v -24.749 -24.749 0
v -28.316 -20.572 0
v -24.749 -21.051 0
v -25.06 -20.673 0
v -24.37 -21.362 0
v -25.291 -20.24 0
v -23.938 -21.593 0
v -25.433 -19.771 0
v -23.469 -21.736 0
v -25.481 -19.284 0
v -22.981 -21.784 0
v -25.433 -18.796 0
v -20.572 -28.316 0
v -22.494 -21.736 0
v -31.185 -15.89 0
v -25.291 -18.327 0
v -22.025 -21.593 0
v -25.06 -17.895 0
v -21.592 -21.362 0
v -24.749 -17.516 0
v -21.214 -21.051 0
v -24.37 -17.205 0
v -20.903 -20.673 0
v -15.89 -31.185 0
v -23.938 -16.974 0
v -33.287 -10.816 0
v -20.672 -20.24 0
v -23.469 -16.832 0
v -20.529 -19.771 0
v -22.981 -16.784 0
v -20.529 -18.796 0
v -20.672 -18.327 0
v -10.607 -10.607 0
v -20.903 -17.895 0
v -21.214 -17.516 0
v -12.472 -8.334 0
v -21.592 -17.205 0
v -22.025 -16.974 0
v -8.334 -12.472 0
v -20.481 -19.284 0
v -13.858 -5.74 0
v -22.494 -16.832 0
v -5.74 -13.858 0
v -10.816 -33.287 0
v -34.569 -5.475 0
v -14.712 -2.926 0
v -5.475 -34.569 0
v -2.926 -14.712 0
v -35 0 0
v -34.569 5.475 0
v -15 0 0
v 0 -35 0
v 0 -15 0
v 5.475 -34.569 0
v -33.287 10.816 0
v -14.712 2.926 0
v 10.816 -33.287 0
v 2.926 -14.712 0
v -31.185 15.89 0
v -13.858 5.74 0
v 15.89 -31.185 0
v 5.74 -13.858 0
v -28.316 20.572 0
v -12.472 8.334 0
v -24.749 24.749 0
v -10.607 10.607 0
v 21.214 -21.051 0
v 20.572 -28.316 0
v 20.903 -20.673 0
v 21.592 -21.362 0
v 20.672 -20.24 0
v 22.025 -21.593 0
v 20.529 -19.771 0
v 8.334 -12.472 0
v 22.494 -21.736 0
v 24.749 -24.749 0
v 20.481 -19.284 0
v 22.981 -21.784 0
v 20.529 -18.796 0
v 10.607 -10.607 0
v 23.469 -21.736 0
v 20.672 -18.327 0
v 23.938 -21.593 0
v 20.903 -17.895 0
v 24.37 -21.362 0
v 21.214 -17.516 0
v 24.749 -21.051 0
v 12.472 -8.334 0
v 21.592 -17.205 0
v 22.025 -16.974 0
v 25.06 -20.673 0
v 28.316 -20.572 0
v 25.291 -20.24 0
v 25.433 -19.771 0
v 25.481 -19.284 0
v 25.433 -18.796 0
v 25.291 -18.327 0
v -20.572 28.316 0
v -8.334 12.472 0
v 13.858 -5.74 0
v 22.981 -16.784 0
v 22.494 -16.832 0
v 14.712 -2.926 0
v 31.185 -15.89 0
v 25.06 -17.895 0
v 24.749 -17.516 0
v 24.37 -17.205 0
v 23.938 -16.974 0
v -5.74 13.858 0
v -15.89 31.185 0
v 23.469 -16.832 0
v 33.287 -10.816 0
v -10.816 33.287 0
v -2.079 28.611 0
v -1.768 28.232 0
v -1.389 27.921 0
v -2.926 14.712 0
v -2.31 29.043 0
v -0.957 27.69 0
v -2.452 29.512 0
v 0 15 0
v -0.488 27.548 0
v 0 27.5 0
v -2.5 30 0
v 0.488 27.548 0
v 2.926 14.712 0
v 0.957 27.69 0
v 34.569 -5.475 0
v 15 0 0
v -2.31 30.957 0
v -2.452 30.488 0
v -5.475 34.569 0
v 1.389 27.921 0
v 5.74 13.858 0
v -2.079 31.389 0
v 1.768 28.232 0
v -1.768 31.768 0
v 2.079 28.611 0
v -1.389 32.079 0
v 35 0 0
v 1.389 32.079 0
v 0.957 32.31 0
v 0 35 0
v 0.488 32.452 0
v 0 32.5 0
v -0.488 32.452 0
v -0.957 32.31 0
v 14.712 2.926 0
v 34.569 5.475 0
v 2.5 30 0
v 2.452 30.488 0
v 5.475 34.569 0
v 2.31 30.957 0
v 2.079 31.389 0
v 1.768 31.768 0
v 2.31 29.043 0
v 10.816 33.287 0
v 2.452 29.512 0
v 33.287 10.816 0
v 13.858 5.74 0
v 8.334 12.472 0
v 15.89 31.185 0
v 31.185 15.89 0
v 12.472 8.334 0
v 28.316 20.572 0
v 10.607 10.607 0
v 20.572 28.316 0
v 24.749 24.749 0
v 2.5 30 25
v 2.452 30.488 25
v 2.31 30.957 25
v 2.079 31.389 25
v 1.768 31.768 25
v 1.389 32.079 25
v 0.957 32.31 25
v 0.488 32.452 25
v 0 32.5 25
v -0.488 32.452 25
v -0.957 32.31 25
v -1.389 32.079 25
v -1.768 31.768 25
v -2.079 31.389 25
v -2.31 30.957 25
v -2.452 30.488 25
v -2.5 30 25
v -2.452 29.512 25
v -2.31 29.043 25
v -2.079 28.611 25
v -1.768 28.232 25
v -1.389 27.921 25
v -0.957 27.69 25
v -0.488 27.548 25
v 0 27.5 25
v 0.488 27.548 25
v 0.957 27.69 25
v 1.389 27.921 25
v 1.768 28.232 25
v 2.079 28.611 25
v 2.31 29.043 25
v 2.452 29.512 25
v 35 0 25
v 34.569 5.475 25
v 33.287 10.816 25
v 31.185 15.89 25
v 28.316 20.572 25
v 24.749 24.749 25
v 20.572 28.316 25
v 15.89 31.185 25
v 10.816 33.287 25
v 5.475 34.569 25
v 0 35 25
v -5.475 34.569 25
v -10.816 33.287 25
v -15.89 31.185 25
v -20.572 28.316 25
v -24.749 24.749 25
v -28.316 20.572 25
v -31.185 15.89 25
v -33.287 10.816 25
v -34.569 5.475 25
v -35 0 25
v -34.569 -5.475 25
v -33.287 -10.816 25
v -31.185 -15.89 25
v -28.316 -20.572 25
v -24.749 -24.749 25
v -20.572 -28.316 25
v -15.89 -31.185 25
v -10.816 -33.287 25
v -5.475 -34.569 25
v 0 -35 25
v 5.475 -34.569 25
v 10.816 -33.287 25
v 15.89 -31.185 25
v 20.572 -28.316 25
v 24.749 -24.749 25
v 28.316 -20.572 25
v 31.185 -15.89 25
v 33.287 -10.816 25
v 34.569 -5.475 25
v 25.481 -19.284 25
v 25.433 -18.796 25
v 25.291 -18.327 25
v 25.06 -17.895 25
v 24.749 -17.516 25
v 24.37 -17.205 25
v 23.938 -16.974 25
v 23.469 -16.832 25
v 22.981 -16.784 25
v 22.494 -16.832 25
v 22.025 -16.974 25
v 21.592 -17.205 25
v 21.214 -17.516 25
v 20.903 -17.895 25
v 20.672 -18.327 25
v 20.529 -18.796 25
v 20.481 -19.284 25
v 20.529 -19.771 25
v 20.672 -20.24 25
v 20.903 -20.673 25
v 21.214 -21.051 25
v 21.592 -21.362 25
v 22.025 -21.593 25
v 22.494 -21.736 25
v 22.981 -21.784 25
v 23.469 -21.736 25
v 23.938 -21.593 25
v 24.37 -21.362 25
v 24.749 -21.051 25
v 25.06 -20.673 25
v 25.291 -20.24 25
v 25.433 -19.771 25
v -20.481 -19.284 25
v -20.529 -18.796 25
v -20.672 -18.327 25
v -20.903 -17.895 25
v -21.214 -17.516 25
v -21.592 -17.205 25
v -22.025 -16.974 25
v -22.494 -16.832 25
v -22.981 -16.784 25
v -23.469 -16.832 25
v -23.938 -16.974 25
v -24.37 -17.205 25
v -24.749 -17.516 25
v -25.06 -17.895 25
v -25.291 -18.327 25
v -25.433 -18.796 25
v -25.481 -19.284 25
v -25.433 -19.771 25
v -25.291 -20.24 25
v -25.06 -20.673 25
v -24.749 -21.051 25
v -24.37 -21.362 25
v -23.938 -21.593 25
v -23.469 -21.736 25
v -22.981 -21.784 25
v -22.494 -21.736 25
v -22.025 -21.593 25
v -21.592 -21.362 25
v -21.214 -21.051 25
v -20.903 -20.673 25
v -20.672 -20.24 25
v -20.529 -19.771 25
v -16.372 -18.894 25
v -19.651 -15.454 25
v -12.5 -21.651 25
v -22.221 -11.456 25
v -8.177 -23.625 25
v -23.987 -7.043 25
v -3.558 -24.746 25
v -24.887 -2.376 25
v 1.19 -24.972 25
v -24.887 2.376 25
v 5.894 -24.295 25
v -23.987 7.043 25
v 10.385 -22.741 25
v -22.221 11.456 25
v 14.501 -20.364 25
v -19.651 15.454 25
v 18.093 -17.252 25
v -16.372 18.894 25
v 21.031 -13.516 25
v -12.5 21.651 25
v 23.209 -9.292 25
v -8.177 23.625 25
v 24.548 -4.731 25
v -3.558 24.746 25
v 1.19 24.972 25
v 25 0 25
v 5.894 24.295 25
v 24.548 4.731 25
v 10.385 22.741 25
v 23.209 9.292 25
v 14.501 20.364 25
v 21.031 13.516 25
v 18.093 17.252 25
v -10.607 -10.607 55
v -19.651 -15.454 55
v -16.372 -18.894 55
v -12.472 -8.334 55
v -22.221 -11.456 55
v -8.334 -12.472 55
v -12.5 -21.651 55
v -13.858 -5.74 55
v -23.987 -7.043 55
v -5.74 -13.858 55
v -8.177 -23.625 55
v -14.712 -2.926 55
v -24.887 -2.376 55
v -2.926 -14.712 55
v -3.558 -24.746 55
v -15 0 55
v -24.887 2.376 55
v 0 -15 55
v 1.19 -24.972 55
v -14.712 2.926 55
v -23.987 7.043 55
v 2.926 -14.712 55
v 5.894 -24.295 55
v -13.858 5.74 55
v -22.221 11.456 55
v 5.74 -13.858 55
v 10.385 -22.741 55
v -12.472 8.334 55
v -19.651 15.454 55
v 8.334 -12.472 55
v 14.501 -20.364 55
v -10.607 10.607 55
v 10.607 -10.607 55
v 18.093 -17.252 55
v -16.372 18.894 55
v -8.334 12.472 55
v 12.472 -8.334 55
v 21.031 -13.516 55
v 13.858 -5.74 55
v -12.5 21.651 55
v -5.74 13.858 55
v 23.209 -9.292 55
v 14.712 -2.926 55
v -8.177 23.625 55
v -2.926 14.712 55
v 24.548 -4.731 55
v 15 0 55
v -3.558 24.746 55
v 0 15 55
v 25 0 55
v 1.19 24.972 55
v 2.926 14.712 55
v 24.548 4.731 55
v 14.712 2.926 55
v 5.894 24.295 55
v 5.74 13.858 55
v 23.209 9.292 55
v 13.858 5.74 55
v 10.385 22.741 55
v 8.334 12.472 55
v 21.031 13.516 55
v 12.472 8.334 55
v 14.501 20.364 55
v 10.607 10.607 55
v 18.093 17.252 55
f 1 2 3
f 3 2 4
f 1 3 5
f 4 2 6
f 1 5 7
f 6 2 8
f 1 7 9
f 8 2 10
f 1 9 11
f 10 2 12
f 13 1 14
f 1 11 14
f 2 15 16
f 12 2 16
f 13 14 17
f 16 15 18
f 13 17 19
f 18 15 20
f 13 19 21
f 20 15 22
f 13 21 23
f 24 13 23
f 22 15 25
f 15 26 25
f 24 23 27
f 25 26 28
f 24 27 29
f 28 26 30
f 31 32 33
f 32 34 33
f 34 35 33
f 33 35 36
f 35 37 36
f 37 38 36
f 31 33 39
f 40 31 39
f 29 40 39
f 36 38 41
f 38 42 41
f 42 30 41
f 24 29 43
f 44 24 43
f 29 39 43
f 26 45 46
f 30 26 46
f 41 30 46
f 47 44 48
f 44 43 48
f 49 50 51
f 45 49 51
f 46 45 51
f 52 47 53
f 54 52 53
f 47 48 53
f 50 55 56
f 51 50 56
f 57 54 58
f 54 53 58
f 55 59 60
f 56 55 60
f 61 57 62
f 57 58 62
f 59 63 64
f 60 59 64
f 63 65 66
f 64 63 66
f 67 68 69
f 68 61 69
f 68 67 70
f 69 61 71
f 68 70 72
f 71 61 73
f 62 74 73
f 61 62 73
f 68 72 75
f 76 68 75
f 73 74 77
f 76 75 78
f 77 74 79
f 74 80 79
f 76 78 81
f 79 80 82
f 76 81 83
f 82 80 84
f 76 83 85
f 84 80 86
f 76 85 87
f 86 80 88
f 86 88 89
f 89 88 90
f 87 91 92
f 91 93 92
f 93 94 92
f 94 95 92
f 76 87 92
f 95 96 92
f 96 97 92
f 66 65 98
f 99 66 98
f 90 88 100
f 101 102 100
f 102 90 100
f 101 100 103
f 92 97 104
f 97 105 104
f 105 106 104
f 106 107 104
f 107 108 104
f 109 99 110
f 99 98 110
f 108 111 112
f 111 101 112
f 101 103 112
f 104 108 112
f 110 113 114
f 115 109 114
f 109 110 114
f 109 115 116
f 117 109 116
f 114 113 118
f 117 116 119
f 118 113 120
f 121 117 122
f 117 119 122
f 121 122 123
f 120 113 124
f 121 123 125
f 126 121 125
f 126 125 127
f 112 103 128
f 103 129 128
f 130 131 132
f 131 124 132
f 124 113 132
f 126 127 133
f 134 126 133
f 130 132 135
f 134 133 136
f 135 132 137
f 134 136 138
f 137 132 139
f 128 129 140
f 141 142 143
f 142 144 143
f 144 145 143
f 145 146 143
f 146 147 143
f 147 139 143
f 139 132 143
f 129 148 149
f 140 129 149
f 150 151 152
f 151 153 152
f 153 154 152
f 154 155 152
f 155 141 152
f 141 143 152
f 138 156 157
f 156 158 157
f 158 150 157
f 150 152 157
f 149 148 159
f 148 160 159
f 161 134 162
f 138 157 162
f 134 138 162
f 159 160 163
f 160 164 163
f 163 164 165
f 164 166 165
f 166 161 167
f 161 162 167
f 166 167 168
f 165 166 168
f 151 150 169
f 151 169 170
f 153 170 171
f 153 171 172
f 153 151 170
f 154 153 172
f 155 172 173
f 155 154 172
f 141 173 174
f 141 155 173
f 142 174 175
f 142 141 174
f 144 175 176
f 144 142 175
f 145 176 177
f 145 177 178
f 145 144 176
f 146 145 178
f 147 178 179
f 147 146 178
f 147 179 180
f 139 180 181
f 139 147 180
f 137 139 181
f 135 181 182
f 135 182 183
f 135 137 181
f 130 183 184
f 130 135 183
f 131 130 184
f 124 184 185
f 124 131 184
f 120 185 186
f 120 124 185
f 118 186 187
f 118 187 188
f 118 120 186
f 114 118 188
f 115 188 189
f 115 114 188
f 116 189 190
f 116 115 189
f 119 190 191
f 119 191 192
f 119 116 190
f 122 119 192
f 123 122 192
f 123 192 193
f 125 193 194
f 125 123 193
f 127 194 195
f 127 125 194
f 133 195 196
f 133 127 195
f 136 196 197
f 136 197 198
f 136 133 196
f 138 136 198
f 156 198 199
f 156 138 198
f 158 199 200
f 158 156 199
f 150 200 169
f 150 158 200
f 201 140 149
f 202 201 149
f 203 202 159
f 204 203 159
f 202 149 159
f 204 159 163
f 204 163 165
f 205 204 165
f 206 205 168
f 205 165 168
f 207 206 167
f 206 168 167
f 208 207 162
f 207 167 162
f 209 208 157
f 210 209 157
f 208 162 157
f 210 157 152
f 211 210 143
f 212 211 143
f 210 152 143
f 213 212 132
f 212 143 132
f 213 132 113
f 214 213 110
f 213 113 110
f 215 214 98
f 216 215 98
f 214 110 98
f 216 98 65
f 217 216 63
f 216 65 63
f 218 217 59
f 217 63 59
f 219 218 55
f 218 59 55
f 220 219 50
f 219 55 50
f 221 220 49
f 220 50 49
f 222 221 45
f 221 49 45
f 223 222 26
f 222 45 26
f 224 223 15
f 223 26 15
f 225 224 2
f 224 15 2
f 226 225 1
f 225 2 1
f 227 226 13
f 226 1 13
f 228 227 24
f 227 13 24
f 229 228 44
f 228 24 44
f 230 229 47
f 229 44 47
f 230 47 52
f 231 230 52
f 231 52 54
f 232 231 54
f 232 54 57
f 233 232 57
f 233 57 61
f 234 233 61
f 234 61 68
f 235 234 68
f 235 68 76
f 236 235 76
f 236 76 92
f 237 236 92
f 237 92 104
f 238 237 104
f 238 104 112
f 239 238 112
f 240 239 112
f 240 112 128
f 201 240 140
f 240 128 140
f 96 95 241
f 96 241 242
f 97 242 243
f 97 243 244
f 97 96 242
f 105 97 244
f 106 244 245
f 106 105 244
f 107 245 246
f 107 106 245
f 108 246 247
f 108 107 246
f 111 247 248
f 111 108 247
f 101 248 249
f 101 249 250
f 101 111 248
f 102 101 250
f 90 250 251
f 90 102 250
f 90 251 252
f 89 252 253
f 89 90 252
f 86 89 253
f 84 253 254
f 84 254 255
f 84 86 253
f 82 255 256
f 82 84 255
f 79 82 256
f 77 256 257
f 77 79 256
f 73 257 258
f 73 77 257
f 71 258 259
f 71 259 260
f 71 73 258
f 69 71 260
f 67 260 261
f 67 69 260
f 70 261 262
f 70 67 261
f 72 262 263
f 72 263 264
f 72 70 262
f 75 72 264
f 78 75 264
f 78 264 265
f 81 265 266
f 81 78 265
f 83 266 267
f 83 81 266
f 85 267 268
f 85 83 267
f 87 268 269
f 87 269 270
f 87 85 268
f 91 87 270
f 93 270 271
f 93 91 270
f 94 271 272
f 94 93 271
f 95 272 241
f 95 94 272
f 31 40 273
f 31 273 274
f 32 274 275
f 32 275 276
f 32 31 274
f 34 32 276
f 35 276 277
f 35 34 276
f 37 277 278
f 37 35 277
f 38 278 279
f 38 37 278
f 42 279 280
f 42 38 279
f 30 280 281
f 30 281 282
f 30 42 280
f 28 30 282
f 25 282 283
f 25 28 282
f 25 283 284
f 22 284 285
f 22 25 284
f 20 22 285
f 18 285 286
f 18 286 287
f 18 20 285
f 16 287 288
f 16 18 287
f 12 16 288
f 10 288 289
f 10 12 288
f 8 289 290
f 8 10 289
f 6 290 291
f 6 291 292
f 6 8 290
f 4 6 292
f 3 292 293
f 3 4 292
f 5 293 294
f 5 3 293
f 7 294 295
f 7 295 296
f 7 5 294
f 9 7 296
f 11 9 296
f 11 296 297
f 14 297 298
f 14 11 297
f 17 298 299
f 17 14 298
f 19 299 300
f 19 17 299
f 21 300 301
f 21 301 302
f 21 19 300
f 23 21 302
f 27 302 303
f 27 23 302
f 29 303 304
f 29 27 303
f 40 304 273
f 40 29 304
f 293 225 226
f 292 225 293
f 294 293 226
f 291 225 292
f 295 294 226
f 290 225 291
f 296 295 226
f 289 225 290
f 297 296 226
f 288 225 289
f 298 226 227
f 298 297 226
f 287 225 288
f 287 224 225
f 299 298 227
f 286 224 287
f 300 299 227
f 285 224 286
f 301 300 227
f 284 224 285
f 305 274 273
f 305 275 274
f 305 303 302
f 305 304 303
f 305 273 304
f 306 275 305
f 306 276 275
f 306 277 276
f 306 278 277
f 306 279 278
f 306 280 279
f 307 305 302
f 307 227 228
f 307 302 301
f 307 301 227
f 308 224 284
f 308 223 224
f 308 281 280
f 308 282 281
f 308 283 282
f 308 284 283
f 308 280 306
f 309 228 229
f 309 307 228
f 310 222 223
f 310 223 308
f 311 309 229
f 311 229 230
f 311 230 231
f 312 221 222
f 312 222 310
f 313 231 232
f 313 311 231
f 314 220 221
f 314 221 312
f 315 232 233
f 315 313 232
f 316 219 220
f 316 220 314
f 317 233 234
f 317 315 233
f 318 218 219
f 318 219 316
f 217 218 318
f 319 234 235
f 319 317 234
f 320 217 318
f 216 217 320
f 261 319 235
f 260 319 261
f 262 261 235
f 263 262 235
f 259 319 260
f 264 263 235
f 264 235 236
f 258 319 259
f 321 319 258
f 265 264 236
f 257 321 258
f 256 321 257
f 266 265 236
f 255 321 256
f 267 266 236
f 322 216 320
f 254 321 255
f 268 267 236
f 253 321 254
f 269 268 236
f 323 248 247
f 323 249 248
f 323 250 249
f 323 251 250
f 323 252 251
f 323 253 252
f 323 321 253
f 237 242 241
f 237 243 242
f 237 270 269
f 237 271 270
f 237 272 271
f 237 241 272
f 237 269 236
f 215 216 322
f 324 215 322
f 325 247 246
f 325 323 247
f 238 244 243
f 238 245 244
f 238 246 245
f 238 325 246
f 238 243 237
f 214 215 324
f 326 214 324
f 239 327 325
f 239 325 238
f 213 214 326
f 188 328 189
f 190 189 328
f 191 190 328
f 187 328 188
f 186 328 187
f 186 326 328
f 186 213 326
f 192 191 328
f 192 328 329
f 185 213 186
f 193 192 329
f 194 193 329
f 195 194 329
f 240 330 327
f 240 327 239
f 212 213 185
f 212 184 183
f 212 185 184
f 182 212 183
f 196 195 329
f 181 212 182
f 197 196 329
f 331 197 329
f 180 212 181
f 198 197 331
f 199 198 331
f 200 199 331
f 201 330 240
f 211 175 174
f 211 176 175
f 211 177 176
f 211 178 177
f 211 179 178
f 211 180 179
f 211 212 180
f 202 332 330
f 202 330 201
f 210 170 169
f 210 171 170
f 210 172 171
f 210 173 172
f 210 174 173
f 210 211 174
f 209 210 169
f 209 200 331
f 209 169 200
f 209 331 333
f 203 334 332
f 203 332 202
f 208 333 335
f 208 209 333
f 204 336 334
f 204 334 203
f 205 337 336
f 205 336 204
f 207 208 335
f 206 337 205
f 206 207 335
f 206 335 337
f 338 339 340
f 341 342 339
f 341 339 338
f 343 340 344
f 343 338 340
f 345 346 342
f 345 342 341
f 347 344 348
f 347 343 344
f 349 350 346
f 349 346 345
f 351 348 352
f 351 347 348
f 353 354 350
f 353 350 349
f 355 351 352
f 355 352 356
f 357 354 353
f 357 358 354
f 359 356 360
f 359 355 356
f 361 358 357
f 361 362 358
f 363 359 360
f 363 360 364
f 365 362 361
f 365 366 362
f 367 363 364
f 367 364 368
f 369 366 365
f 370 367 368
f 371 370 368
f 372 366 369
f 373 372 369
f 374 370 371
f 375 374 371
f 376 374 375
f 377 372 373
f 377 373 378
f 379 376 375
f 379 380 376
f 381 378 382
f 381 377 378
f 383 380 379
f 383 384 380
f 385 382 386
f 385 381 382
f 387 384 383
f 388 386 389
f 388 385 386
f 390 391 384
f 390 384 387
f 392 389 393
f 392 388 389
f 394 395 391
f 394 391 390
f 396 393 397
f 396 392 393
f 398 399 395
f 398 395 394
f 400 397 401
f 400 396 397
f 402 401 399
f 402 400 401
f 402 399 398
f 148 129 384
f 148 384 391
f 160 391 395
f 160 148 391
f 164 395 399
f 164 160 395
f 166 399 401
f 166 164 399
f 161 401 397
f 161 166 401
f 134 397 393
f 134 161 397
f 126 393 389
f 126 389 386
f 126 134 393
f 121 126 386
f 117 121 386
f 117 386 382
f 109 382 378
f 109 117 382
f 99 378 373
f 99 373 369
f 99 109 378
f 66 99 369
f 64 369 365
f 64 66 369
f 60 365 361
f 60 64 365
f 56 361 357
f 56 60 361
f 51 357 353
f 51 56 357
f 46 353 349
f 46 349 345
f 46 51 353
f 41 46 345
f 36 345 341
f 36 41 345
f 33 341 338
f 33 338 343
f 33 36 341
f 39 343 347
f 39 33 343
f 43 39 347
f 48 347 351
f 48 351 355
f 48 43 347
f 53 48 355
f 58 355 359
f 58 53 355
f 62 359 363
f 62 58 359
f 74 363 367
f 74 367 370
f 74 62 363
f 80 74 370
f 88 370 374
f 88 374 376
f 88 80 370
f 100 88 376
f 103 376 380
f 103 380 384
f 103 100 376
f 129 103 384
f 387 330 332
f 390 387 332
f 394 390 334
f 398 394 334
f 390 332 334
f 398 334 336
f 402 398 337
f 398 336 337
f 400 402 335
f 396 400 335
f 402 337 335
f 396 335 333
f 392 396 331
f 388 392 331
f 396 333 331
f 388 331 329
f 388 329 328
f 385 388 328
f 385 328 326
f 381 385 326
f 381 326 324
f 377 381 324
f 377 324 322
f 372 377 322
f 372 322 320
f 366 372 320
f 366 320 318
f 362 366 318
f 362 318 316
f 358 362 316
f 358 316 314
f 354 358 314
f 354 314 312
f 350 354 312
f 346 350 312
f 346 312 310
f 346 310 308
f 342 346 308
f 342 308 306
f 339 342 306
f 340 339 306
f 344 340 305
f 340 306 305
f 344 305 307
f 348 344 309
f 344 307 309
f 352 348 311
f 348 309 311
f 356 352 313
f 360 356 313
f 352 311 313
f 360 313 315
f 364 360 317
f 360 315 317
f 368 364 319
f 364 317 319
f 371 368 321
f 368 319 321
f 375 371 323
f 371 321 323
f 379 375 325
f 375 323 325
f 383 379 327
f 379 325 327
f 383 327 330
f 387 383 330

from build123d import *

# Parameters (mm, degrees)
F0_R     = 35
F0_R_2   = 2.5
F0_R_3   = 25
F1_DEPTH = 25
F0_R_4   = 15
F2_DEPTH = 55


# Not quite as in the source:
# - the program builds the solid bodies; features that only make, move or delete a surface that nothing else refers to are left out


with BuildPart() as f1:
    # F0 (on Top) → F1 (new body)
    with BuildSketch(Plane.XY):
        Circle(F0_R)
        with Locations((-22.9813332936, -19.2836282906)):
            Circle(F0_R_2, mode=Mode.SUBTRACT)
        with Locations((22.9813332936, -19.2836282906)):
            Circle(F0_R_2, mode=Mode.SUBTRACT)
        Circle(F0_R_3, mode=Mode.SUBTRACT)
        with Locations((0, 30)):
            Circle(F0_R_2, mode=Mode.SUBTRACT)
    extrude(amount=F1_DEPTH)

    # F0 (on Top) → F2 (join)
    with BuildSketch(Plane.XY):
        Circle(F0_R_3)
        Circle(F0_R_4, mode=Mode.SUBTRACT)
    extrude(amount=F2_DEPTH)


solid = f1.part
